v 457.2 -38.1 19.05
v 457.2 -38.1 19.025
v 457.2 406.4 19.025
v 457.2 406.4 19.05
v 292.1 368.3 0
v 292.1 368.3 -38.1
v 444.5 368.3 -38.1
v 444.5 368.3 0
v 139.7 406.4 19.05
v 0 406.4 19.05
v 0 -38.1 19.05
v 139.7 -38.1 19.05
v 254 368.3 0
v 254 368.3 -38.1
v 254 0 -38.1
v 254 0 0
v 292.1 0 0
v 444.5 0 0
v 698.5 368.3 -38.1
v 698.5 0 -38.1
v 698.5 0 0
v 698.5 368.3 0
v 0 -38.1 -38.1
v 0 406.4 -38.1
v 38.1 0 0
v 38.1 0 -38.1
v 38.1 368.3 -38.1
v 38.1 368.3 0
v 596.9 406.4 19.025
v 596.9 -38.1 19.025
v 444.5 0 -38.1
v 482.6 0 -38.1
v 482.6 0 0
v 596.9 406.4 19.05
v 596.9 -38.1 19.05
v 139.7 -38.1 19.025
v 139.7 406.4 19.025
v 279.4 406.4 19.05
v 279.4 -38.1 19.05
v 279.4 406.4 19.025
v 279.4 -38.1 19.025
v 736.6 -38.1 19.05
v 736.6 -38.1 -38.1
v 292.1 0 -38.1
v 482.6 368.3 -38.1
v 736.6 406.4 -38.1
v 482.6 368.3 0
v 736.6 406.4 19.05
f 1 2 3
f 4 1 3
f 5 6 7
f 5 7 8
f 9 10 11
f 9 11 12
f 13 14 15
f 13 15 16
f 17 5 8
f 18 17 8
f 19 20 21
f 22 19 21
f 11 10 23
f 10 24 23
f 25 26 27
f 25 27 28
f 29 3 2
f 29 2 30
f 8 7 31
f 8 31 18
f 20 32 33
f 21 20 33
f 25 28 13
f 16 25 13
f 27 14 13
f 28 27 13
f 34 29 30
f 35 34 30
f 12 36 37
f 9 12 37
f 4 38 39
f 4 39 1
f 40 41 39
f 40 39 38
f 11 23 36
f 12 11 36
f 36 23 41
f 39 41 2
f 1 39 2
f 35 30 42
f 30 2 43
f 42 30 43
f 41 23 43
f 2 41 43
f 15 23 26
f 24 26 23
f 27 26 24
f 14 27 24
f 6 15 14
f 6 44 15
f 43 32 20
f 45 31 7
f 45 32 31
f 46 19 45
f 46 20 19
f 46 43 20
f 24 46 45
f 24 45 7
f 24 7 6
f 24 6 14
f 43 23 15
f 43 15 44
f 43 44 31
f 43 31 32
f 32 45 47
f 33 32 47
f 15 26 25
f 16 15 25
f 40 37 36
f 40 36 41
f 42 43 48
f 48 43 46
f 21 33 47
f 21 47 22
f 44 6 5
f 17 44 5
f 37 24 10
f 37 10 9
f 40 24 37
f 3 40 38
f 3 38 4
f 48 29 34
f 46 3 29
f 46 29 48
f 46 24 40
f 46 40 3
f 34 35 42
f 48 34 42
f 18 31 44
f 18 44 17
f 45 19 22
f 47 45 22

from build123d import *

# Parameters (mm, degrees)
F0_W      = 38.1
F0_H      = 38.1
F1_DEPTH  = 736.6
F2_W      = 38.1
F2_H      = 38.1
F3_DEPTH  = 368.3
F4_W      = 38.1
F4_H      = 38.1
F5_DEPTH  = 736.6
F6_W      = 38.1
F6_H      = 38.1
F7_DEPTH  = 368.3
F8_W      = 101.6
F8_H      = 368.3
F9_DEPTH  = 19.05
F10_W     = 101.6
F10_H     = 368.3
F11_DEPTH = 19.05
F12_W     = 114.3
F12_H     = 368.3
F13_DEPTH = 19.0246
F14_W     = 114.3
F14_H     = 368.3
F15_DEPTH = 19.0246
F16_W     = 177.8
F16_H     = 444.5
F16_W_2   = 152.4
F16_H_2   = 368.3
F17_DEPTH = 19.05


with BuildPart() as f1:
    # F0 (on Right) → F1 (new body)
    with BuildSketch(Plane.YZ):
        with Locations((-19.05, -19.05)):
            Rectangle(F0_W, F0_H)
    extrude(amount=F1_DEPTH)

    # F2 (on face) → F3 (join)
    with BuildSketch(Plane(origin=(0, 0, 0), x_dir=(-1, 0, 0), z_dir=(0, 1, 0))):
        with Locations((-19.05, -19.05)):
            Rectangle(F2_W, F2_H)
        with Locations((-717.55, -19.05)):
            Rectangle(F2_W, F2_H)
    extrude(amount=F3_DEPTH)

    # F4 (on face) → F5 (join)
    with BuildSketch(Plane.YZ.offset(736.6)):
        with Locations((387.35, -19.05)):
            Rectangle(F4_W, F4_H)
    extrude(amount=-F5_DEPTH)

    # F6 (on face) → F7 (join, through all)
    with BuildSketch(Plane.XZ.offset(-368.3)):
        with Locations((273.05, -19.05)):
            Rectangle(F6_W, F6_H)
        with Locations((463.55, -19.05)):
            Rectangle(F6_W, F6_H)
    extrude(amount=F7_DEPTH)

    # F8 (on face) → F9 (join)
    with BuildSketch(Plane.XY):
        Polygon((139.7, 406.4), (0, 406.4), (0, -38.1), (139.7, -38.1), (139.7, 0), (38.1, 0), (38.1, 368.3), (139.7, 368.3), align=None)
        with Locations((88.9, 184.15)):
            Rectangle(F8_W, F8_H)
    extrude(amount=F9_DEPTH)

    # F10 (on face) → F11 (join)
    with BuildSketch(Plane.XY):
        with Locations((647.7, 184.15)):
            Rectangle(F10_W, F10_H)
        Polygon((736.6, -38.1), (736.6, 406.4), (596.9, 406.4), (596.9, 368.3), (698.5, 368.3), (698.5, 0), (596.9, 0), (596.9, -38.1), align=None)
    extrude(amount=F11_DEPTH)

    # F12 (on face) → F13 (join)
    with BuildSketch(Plane.XY):
        Polygon((279.4, 406.4), (139.7, 406.4), (139.7, 368.3), (254, 368.3), (254, 0), (139.7, 0), (139.7, -38.1), (279.4, -38.1), align=None)
        with Locations((196.85, 184.15)):
            Rectangle(F12_W, F12_H)
    extrude(amount=F13_DEPTH)

    # F14 (on face) → F15 (join)
    with BuildSketch(Plane.XY):
        Polygon((596.9, 368.3), (596.9, 406.4), (457.2, 406.4), (457.2, -38.1), (596.9, -38.1), (596.9, 0), (482.6, 0), (482.6, 368.3), align=None)
        with Locations((539.75, 184.15)):
            Rectangle(F14_W, F14_H)
    extrude(amount=F15_DEPTH)

    # F16 (on face) → F17 (join)
    with BuildSketch(Plane.XY):
        with Locations((368.3, 184.15)):
            Rectangle(F16_W, F16_H)
        with Locations((368.3, 184.15)):
            Rectangle(F16_W_2, F16_H_2, mode=Mode.SUBTRACT)
        with Locations((368.3, 184.15)):
            Rectangle(F16_W_2, F16_H_2)
    extrude(amount=F17_DEPTH)


solid = f1.part
